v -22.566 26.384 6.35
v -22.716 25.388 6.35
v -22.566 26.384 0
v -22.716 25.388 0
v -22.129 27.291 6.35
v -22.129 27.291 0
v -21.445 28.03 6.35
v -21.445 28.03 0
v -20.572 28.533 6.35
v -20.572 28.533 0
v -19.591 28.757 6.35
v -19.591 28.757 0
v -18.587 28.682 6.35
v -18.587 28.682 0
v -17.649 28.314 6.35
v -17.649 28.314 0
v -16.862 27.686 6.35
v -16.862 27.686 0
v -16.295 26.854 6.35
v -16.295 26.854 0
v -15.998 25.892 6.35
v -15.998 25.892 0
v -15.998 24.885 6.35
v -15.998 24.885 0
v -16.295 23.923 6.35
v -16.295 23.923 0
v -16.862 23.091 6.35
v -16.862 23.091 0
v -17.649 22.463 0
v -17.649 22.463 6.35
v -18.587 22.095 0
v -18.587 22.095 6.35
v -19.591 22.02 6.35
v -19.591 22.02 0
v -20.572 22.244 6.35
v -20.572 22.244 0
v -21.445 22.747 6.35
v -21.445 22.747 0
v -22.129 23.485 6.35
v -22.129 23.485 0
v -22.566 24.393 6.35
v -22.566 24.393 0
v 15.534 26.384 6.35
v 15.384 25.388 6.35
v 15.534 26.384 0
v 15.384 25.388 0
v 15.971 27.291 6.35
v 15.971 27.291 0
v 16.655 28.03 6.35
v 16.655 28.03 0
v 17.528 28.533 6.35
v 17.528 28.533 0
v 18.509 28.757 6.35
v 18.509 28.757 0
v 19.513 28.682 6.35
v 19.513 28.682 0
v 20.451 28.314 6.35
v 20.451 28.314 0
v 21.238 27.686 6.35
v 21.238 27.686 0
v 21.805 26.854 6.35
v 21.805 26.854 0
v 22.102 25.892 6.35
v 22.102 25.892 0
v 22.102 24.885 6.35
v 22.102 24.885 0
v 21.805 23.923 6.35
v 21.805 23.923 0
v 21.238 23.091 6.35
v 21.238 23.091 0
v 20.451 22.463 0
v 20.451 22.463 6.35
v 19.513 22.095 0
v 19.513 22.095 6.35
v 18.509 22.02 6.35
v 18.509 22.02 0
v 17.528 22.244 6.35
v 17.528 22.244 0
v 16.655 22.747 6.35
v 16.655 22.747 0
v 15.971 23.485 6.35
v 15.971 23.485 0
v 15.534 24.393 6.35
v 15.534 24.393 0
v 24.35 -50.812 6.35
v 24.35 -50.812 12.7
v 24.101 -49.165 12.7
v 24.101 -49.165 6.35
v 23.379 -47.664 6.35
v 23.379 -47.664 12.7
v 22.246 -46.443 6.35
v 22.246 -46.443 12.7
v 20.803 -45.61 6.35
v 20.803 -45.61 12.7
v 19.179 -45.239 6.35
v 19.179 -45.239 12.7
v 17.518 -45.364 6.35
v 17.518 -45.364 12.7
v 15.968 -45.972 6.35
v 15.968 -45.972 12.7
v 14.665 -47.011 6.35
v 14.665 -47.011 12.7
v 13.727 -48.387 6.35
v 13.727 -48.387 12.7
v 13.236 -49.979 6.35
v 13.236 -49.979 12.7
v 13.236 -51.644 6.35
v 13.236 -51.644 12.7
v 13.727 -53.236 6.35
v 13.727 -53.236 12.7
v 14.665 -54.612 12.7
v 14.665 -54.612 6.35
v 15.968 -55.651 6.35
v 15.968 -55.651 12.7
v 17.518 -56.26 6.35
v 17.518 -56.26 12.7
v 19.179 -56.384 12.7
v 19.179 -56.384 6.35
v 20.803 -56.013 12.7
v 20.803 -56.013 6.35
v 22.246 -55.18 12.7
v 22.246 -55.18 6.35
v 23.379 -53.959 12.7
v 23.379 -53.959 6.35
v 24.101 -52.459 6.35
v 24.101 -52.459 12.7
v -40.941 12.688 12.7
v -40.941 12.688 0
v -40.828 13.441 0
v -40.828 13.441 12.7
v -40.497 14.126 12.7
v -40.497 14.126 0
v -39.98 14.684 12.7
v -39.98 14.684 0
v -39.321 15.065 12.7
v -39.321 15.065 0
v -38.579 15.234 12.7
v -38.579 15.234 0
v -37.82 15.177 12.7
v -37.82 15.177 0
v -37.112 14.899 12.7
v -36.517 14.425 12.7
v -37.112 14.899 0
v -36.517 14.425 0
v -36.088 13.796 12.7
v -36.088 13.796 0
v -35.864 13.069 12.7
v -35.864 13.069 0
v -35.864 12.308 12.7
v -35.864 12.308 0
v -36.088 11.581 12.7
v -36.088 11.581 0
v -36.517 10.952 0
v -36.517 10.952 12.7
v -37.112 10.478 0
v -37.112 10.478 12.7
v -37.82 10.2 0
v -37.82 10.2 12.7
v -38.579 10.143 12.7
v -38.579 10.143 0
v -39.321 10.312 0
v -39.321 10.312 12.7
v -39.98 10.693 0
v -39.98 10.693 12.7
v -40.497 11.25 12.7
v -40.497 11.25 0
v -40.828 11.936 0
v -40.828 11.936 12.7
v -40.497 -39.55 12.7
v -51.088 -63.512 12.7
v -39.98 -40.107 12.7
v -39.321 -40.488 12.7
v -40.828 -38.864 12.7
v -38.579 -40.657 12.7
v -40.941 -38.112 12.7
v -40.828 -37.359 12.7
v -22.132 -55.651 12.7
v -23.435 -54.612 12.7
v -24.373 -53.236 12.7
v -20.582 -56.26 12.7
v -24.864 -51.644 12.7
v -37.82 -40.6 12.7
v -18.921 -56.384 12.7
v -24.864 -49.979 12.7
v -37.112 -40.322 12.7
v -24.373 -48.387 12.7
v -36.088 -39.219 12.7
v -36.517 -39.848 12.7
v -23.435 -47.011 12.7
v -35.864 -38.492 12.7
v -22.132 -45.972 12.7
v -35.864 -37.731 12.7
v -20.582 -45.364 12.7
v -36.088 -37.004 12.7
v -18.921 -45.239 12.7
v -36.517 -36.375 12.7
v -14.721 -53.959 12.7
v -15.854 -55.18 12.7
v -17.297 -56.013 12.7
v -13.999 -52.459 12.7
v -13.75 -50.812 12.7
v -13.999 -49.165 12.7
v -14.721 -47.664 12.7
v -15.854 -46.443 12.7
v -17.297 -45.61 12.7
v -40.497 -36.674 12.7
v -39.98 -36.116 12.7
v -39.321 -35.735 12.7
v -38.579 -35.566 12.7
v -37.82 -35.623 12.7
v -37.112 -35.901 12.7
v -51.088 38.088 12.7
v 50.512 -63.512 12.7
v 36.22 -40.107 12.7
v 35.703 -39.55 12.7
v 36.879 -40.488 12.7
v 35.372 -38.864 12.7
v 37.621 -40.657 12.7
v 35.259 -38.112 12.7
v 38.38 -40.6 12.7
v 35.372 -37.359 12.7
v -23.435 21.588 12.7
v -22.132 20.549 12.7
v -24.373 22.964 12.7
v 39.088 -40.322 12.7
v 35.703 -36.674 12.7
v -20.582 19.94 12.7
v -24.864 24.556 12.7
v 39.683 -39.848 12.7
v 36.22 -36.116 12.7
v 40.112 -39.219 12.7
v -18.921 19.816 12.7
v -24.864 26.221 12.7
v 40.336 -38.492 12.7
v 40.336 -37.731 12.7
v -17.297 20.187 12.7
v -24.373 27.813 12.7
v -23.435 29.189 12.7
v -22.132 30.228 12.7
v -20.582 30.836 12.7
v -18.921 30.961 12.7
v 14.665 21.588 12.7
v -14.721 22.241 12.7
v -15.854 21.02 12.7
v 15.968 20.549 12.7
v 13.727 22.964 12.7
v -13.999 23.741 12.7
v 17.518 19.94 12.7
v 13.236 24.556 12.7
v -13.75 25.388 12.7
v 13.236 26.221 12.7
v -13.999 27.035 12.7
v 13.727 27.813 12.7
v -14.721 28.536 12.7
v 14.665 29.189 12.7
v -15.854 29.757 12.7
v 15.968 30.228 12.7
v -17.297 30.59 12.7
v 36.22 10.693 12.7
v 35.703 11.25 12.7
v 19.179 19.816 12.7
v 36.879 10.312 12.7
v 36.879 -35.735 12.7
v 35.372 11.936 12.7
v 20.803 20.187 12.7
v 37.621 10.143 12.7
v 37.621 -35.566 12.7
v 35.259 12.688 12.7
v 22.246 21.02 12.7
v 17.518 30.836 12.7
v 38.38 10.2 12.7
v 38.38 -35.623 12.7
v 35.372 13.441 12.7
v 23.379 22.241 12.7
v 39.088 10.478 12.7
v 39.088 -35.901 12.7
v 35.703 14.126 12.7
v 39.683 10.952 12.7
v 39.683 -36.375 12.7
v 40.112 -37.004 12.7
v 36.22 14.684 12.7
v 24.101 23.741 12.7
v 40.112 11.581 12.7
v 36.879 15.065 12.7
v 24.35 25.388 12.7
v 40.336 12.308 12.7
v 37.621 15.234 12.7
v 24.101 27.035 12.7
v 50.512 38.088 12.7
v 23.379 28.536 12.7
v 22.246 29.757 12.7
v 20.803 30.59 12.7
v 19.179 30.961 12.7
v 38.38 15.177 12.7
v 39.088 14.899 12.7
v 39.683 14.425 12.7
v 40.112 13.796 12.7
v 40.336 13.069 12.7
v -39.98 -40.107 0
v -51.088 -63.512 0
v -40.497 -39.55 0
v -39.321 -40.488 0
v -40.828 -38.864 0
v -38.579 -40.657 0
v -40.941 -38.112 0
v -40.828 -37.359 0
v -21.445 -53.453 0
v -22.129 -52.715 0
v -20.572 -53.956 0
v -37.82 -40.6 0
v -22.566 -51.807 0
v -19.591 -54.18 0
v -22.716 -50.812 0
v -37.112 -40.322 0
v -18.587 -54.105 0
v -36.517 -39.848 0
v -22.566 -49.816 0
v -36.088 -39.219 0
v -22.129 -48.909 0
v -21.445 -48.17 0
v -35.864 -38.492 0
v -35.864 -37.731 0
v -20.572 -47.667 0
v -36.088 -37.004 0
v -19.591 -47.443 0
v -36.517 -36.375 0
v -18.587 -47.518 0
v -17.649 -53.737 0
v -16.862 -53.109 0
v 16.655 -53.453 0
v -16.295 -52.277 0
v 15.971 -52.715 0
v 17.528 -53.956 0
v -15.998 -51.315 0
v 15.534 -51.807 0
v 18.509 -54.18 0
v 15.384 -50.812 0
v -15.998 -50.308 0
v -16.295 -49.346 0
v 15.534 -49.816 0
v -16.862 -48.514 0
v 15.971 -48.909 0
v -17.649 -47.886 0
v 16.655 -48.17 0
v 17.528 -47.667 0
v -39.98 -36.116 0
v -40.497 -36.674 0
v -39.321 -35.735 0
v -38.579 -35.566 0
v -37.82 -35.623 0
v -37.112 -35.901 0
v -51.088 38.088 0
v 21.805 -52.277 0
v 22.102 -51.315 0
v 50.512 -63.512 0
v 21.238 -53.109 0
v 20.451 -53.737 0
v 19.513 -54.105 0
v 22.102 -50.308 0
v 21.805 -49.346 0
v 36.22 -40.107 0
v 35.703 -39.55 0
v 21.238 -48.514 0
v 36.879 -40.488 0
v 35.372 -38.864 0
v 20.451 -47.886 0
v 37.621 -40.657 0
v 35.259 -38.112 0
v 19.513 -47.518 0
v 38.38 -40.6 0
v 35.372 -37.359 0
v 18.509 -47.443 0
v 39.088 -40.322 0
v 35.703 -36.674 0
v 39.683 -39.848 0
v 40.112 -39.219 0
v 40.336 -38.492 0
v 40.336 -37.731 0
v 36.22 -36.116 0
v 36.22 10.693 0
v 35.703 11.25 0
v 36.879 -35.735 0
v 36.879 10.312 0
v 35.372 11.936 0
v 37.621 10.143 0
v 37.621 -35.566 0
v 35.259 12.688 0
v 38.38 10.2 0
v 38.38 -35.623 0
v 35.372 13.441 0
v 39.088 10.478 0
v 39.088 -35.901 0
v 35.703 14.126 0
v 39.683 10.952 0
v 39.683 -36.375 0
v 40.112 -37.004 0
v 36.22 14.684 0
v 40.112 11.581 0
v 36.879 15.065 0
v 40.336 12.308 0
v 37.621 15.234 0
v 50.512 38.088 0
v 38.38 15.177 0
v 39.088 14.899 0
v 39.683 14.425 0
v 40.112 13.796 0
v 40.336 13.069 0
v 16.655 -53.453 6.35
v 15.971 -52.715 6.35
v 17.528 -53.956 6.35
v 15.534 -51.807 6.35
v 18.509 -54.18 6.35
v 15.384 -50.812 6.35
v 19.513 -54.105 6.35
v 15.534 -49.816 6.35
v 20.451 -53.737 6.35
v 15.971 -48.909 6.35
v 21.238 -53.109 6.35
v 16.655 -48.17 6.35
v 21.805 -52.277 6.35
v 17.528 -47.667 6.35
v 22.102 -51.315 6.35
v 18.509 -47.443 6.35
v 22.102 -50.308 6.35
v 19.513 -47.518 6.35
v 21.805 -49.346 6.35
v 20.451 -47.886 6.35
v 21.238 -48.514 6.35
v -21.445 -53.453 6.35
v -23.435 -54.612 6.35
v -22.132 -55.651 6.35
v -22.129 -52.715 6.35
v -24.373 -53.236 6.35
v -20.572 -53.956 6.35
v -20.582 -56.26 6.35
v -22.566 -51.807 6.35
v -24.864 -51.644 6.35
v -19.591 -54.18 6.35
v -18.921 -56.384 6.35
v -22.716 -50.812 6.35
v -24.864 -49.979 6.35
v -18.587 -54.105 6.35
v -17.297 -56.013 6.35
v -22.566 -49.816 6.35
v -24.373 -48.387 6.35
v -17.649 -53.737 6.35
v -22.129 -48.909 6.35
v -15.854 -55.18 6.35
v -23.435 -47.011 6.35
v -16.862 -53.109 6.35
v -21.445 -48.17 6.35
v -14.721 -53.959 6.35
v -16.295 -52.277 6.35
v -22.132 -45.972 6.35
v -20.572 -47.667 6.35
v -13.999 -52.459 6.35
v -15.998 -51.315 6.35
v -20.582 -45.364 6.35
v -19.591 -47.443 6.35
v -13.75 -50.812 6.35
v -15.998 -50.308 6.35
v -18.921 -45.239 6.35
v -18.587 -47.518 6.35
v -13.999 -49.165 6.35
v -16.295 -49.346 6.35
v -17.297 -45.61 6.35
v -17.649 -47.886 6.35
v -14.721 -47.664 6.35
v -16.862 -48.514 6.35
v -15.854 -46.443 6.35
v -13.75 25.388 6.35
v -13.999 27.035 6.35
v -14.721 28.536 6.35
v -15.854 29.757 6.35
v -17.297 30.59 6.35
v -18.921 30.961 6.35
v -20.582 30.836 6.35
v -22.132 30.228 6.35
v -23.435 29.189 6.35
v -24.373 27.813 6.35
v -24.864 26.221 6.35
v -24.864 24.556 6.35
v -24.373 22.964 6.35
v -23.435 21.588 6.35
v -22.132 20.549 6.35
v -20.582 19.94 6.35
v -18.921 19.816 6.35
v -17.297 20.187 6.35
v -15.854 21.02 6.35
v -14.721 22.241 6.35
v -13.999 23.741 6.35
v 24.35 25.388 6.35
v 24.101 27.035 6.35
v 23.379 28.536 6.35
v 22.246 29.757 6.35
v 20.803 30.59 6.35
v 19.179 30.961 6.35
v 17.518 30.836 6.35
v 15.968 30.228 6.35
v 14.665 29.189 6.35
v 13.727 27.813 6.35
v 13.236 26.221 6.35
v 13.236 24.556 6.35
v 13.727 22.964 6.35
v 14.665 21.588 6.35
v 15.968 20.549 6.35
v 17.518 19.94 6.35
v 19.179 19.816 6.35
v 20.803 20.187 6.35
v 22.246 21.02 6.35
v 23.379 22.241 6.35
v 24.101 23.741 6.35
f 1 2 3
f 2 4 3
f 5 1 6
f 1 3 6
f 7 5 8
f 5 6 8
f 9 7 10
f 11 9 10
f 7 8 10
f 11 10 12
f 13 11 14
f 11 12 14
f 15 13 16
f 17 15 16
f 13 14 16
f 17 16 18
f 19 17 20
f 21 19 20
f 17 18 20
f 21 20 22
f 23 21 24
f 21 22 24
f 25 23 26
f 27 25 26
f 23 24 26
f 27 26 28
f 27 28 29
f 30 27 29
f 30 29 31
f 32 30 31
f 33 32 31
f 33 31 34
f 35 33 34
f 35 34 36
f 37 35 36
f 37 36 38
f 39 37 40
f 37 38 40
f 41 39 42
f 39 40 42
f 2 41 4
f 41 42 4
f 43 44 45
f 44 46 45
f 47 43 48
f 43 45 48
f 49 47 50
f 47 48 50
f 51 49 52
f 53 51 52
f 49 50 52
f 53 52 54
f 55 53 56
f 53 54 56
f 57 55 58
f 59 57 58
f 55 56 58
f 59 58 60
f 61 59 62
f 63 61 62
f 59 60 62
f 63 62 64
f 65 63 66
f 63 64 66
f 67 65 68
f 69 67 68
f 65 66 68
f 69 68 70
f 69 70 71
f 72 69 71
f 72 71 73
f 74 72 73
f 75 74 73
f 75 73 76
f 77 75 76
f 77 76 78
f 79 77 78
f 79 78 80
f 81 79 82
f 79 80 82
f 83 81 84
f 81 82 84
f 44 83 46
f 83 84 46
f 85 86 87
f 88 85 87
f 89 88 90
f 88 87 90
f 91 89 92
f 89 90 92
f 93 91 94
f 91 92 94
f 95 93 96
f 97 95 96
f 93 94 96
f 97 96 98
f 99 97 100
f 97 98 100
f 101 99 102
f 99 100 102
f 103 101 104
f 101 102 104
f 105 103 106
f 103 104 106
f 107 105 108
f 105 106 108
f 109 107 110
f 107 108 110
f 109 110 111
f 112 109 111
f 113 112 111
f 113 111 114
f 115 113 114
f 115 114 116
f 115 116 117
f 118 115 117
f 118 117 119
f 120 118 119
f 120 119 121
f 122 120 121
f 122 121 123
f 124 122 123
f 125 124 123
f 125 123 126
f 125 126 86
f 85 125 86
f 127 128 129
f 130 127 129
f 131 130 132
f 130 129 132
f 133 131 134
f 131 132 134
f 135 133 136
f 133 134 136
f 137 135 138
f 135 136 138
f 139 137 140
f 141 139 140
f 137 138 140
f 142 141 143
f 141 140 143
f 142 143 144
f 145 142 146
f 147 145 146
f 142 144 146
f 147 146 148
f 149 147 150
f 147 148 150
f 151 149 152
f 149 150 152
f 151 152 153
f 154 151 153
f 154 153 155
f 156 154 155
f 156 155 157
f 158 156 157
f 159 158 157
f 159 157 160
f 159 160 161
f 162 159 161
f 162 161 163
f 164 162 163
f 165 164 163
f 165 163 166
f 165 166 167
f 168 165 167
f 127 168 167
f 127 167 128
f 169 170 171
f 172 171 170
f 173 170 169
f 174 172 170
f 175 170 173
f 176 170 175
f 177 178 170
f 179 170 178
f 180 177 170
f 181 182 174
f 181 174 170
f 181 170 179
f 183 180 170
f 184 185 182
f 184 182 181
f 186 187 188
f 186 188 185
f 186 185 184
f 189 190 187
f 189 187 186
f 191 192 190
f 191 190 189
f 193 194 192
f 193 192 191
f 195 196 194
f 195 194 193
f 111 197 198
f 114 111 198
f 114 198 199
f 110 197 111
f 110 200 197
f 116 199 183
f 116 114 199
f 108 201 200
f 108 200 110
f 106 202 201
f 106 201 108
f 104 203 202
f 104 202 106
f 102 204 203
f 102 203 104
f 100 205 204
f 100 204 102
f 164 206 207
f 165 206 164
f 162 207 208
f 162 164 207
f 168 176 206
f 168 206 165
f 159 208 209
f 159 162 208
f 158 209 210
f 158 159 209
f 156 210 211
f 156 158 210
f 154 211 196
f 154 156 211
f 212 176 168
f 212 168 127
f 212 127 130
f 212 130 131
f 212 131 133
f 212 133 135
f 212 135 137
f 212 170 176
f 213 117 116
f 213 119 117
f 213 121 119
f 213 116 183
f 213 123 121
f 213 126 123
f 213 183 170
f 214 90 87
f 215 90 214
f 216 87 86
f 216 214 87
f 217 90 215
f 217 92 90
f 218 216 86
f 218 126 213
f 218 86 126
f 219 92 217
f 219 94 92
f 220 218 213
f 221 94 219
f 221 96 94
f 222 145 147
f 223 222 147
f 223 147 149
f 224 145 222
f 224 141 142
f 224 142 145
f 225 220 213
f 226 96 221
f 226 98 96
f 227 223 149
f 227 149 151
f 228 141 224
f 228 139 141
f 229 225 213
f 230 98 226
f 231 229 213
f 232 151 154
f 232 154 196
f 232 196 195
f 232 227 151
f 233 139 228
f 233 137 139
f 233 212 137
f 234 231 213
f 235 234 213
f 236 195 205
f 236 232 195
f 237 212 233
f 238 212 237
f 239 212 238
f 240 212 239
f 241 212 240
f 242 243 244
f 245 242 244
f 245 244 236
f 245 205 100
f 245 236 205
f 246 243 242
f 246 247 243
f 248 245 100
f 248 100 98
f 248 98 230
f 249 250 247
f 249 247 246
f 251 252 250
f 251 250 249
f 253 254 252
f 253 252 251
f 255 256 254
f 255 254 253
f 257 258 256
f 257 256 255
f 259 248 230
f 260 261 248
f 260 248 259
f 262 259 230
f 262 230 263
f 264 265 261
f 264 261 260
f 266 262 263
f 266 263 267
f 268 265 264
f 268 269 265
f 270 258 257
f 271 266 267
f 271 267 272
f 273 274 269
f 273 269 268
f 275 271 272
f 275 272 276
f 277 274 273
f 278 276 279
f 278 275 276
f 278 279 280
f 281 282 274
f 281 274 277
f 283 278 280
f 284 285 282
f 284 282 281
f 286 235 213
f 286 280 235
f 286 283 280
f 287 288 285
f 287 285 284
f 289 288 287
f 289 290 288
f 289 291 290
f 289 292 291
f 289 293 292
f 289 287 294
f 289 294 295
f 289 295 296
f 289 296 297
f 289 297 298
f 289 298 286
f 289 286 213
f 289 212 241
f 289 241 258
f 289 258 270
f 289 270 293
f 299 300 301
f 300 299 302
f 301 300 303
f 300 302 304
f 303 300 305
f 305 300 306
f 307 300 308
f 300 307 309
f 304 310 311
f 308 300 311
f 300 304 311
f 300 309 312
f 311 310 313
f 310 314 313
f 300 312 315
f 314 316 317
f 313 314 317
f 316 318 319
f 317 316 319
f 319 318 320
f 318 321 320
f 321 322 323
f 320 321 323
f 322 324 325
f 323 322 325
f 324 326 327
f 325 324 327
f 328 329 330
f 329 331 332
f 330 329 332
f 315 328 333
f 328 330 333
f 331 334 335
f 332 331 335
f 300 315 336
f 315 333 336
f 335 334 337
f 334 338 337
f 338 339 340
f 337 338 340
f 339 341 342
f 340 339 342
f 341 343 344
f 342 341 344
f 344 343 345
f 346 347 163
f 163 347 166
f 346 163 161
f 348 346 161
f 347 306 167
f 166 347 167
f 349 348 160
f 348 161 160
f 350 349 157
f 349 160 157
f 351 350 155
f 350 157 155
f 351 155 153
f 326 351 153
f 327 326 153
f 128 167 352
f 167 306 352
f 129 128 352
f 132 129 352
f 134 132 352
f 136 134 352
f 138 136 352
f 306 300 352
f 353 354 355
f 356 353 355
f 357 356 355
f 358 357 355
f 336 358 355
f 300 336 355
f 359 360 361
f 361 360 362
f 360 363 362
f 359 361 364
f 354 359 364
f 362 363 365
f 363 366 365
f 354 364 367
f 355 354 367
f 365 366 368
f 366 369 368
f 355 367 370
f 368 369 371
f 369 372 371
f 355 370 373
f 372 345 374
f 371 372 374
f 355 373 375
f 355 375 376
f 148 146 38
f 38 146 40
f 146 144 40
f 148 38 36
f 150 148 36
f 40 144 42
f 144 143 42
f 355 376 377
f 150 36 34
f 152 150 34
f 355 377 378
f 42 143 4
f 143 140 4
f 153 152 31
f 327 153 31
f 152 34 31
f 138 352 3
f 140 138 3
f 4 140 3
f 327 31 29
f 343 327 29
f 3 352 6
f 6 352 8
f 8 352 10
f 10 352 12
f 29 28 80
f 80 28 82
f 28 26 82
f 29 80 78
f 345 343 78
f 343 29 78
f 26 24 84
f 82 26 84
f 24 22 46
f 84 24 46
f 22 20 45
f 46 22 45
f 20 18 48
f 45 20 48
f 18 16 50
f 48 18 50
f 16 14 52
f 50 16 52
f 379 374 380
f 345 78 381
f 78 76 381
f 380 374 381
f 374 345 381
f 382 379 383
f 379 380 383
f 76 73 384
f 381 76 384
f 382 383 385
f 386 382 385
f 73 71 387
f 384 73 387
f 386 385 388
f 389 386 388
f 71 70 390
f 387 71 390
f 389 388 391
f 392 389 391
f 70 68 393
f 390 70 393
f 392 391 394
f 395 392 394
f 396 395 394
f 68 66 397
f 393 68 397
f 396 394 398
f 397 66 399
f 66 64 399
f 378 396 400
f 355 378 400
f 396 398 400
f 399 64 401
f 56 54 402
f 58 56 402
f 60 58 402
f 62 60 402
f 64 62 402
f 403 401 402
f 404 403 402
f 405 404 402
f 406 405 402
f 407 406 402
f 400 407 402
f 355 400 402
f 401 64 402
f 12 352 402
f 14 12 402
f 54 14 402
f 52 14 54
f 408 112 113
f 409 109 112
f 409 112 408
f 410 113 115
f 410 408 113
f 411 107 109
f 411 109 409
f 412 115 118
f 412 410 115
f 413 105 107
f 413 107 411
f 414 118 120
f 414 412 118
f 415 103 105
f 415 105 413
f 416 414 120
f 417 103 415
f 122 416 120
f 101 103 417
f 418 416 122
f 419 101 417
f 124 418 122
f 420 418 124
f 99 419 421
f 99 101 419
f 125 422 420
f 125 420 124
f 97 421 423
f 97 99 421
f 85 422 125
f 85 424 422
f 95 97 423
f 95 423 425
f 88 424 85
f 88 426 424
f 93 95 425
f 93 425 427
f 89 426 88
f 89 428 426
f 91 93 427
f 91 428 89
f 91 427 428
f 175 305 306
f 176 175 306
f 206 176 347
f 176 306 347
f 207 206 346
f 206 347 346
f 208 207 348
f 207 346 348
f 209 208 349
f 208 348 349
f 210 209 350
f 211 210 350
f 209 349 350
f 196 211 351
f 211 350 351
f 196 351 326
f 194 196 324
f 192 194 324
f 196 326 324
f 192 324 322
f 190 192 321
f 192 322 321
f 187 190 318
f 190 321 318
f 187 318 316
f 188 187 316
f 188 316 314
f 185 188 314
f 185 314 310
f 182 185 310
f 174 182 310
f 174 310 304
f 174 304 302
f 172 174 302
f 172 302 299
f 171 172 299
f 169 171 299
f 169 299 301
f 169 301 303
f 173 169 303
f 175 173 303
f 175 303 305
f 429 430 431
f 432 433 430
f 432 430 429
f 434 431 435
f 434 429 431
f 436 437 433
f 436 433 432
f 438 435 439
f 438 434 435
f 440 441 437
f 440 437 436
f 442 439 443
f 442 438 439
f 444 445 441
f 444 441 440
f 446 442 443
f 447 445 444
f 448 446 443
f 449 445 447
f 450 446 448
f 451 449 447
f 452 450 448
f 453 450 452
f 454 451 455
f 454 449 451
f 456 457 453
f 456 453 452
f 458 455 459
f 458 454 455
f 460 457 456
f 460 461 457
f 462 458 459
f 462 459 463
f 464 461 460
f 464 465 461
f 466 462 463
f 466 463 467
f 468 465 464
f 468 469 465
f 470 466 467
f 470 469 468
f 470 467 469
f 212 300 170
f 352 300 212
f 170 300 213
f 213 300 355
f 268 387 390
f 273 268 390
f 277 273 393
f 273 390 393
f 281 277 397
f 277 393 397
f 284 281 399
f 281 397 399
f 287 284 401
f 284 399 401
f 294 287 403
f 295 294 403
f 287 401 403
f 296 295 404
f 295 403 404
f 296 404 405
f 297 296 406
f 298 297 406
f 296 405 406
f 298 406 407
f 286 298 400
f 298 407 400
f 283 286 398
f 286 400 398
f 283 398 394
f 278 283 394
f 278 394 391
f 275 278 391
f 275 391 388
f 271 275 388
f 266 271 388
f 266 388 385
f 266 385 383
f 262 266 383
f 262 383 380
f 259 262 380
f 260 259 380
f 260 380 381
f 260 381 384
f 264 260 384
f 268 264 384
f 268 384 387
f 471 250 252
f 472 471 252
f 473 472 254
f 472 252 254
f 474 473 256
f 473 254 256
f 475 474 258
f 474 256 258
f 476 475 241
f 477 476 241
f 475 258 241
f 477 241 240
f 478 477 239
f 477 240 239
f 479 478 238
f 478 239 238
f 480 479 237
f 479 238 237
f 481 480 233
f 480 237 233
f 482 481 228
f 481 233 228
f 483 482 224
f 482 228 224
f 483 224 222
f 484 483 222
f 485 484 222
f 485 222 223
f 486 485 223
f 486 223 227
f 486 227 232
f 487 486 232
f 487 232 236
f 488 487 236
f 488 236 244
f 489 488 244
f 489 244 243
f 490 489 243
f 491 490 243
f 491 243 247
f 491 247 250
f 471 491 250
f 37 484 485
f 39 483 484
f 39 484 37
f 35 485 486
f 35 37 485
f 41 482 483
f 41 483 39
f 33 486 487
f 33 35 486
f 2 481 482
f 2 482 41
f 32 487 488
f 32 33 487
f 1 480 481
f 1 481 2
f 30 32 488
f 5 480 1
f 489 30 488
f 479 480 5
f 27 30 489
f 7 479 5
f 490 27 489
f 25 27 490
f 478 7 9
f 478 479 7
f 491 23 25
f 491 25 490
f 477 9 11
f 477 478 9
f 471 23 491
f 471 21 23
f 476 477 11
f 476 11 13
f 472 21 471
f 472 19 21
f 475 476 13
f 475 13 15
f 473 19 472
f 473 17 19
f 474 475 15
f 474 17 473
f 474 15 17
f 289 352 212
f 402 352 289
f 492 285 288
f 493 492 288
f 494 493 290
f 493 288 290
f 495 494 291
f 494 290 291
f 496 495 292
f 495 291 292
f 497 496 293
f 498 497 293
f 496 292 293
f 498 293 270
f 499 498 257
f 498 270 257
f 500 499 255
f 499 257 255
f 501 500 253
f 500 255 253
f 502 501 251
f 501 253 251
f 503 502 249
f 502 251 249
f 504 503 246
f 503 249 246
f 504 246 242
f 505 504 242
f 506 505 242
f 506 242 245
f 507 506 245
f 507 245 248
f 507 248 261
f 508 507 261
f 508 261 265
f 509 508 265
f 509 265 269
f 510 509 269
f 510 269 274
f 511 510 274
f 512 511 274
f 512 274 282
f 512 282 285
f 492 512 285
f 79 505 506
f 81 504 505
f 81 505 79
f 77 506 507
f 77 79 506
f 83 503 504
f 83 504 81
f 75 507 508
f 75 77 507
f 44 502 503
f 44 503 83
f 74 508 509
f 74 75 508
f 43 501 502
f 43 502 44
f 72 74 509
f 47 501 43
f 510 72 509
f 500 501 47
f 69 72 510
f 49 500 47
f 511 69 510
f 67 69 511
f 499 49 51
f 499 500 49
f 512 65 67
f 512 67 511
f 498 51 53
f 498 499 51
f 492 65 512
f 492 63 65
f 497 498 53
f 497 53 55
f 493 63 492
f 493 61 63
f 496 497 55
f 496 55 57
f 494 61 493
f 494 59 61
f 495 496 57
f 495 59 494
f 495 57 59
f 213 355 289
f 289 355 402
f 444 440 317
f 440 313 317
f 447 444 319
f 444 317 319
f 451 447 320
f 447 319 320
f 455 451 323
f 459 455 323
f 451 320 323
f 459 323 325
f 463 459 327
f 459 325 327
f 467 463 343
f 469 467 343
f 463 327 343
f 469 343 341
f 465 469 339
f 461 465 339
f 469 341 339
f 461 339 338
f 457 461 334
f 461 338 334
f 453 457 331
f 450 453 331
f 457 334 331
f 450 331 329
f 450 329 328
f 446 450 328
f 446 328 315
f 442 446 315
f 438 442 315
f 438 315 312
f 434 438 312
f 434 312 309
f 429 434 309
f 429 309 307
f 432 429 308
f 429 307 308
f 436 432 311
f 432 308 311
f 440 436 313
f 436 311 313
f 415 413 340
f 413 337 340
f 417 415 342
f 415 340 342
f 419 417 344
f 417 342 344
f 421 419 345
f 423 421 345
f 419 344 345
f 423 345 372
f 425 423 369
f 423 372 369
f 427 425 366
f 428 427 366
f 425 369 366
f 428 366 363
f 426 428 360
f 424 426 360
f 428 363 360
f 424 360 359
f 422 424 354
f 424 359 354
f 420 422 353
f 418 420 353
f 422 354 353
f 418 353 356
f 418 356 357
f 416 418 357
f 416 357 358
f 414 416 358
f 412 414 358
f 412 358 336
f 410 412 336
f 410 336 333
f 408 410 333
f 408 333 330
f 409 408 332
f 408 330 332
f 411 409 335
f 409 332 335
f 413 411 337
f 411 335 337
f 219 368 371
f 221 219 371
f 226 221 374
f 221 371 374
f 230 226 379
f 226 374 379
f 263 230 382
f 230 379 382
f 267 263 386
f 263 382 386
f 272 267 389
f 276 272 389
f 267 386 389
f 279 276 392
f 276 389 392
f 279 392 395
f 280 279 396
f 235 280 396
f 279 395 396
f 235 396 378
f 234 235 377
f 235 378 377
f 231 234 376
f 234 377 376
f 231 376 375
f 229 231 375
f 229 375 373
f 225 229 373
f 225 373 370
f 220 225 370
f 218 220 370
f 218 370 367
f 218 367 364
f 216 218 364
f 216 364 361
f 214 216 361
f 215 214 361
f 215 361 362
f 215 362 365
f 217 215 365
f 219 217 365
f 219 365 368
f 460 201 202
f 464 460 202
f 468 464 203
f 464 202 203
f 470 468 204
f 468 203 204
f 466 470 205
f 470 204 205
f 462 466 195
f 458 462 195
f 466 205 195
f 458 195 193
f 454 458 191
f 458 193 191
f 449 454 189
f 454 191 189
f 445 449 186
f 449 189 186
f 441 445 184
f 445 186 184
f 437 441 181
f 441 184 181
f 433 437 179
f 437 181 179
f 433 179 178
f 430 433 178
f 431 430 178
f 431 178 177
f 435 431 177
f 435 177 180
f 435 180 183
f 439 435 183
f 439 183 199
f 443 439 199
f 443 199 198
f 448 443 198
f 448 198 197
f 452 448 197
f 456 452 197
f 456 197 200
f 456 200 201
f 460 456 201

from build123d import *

# Parameters (mm, degrees)
F0_W           = 101.6
F0_H           = 101.6
F1_DEPTH       = 12.7
F3_D           = 6.7564
F3_CBORE_D     = 11.176
F3_CBORE_DEPTH = 6.35
F5_D           = 5.1054


with BuildPart() as f1:
    # F0 (on Top) → F1 (new body)
    with BuildSketch(Plane.XY):
        with Locations((-0.288248, -12.711609)):
            Rectangle(F0_W, F0_H)
    extrude(amount=F1_DEPTH)

    # F3 (through all)
    with Locations(Plane.XY.offset(12.7)):
        with Locations((-19.338248, 25.388391), (18.761752, 25.388391), (-19.338248, -50.811609), (18.761752, -50.811609)):
            CounterBoreHole(F3_D / 2, F3_CBORE_D / 2, F3_CBORE_DEPTH)

    # F5 (through all)
    with Locations(Plane.XY.offset(12.7)):
        with Locations((-38.388248, 12.688391), (-38.388248, -38.111609), (37.811752, -38.111609), (37.811752, 12.688391)):
            Hole(F5_D / 2)


solid = f1.part
